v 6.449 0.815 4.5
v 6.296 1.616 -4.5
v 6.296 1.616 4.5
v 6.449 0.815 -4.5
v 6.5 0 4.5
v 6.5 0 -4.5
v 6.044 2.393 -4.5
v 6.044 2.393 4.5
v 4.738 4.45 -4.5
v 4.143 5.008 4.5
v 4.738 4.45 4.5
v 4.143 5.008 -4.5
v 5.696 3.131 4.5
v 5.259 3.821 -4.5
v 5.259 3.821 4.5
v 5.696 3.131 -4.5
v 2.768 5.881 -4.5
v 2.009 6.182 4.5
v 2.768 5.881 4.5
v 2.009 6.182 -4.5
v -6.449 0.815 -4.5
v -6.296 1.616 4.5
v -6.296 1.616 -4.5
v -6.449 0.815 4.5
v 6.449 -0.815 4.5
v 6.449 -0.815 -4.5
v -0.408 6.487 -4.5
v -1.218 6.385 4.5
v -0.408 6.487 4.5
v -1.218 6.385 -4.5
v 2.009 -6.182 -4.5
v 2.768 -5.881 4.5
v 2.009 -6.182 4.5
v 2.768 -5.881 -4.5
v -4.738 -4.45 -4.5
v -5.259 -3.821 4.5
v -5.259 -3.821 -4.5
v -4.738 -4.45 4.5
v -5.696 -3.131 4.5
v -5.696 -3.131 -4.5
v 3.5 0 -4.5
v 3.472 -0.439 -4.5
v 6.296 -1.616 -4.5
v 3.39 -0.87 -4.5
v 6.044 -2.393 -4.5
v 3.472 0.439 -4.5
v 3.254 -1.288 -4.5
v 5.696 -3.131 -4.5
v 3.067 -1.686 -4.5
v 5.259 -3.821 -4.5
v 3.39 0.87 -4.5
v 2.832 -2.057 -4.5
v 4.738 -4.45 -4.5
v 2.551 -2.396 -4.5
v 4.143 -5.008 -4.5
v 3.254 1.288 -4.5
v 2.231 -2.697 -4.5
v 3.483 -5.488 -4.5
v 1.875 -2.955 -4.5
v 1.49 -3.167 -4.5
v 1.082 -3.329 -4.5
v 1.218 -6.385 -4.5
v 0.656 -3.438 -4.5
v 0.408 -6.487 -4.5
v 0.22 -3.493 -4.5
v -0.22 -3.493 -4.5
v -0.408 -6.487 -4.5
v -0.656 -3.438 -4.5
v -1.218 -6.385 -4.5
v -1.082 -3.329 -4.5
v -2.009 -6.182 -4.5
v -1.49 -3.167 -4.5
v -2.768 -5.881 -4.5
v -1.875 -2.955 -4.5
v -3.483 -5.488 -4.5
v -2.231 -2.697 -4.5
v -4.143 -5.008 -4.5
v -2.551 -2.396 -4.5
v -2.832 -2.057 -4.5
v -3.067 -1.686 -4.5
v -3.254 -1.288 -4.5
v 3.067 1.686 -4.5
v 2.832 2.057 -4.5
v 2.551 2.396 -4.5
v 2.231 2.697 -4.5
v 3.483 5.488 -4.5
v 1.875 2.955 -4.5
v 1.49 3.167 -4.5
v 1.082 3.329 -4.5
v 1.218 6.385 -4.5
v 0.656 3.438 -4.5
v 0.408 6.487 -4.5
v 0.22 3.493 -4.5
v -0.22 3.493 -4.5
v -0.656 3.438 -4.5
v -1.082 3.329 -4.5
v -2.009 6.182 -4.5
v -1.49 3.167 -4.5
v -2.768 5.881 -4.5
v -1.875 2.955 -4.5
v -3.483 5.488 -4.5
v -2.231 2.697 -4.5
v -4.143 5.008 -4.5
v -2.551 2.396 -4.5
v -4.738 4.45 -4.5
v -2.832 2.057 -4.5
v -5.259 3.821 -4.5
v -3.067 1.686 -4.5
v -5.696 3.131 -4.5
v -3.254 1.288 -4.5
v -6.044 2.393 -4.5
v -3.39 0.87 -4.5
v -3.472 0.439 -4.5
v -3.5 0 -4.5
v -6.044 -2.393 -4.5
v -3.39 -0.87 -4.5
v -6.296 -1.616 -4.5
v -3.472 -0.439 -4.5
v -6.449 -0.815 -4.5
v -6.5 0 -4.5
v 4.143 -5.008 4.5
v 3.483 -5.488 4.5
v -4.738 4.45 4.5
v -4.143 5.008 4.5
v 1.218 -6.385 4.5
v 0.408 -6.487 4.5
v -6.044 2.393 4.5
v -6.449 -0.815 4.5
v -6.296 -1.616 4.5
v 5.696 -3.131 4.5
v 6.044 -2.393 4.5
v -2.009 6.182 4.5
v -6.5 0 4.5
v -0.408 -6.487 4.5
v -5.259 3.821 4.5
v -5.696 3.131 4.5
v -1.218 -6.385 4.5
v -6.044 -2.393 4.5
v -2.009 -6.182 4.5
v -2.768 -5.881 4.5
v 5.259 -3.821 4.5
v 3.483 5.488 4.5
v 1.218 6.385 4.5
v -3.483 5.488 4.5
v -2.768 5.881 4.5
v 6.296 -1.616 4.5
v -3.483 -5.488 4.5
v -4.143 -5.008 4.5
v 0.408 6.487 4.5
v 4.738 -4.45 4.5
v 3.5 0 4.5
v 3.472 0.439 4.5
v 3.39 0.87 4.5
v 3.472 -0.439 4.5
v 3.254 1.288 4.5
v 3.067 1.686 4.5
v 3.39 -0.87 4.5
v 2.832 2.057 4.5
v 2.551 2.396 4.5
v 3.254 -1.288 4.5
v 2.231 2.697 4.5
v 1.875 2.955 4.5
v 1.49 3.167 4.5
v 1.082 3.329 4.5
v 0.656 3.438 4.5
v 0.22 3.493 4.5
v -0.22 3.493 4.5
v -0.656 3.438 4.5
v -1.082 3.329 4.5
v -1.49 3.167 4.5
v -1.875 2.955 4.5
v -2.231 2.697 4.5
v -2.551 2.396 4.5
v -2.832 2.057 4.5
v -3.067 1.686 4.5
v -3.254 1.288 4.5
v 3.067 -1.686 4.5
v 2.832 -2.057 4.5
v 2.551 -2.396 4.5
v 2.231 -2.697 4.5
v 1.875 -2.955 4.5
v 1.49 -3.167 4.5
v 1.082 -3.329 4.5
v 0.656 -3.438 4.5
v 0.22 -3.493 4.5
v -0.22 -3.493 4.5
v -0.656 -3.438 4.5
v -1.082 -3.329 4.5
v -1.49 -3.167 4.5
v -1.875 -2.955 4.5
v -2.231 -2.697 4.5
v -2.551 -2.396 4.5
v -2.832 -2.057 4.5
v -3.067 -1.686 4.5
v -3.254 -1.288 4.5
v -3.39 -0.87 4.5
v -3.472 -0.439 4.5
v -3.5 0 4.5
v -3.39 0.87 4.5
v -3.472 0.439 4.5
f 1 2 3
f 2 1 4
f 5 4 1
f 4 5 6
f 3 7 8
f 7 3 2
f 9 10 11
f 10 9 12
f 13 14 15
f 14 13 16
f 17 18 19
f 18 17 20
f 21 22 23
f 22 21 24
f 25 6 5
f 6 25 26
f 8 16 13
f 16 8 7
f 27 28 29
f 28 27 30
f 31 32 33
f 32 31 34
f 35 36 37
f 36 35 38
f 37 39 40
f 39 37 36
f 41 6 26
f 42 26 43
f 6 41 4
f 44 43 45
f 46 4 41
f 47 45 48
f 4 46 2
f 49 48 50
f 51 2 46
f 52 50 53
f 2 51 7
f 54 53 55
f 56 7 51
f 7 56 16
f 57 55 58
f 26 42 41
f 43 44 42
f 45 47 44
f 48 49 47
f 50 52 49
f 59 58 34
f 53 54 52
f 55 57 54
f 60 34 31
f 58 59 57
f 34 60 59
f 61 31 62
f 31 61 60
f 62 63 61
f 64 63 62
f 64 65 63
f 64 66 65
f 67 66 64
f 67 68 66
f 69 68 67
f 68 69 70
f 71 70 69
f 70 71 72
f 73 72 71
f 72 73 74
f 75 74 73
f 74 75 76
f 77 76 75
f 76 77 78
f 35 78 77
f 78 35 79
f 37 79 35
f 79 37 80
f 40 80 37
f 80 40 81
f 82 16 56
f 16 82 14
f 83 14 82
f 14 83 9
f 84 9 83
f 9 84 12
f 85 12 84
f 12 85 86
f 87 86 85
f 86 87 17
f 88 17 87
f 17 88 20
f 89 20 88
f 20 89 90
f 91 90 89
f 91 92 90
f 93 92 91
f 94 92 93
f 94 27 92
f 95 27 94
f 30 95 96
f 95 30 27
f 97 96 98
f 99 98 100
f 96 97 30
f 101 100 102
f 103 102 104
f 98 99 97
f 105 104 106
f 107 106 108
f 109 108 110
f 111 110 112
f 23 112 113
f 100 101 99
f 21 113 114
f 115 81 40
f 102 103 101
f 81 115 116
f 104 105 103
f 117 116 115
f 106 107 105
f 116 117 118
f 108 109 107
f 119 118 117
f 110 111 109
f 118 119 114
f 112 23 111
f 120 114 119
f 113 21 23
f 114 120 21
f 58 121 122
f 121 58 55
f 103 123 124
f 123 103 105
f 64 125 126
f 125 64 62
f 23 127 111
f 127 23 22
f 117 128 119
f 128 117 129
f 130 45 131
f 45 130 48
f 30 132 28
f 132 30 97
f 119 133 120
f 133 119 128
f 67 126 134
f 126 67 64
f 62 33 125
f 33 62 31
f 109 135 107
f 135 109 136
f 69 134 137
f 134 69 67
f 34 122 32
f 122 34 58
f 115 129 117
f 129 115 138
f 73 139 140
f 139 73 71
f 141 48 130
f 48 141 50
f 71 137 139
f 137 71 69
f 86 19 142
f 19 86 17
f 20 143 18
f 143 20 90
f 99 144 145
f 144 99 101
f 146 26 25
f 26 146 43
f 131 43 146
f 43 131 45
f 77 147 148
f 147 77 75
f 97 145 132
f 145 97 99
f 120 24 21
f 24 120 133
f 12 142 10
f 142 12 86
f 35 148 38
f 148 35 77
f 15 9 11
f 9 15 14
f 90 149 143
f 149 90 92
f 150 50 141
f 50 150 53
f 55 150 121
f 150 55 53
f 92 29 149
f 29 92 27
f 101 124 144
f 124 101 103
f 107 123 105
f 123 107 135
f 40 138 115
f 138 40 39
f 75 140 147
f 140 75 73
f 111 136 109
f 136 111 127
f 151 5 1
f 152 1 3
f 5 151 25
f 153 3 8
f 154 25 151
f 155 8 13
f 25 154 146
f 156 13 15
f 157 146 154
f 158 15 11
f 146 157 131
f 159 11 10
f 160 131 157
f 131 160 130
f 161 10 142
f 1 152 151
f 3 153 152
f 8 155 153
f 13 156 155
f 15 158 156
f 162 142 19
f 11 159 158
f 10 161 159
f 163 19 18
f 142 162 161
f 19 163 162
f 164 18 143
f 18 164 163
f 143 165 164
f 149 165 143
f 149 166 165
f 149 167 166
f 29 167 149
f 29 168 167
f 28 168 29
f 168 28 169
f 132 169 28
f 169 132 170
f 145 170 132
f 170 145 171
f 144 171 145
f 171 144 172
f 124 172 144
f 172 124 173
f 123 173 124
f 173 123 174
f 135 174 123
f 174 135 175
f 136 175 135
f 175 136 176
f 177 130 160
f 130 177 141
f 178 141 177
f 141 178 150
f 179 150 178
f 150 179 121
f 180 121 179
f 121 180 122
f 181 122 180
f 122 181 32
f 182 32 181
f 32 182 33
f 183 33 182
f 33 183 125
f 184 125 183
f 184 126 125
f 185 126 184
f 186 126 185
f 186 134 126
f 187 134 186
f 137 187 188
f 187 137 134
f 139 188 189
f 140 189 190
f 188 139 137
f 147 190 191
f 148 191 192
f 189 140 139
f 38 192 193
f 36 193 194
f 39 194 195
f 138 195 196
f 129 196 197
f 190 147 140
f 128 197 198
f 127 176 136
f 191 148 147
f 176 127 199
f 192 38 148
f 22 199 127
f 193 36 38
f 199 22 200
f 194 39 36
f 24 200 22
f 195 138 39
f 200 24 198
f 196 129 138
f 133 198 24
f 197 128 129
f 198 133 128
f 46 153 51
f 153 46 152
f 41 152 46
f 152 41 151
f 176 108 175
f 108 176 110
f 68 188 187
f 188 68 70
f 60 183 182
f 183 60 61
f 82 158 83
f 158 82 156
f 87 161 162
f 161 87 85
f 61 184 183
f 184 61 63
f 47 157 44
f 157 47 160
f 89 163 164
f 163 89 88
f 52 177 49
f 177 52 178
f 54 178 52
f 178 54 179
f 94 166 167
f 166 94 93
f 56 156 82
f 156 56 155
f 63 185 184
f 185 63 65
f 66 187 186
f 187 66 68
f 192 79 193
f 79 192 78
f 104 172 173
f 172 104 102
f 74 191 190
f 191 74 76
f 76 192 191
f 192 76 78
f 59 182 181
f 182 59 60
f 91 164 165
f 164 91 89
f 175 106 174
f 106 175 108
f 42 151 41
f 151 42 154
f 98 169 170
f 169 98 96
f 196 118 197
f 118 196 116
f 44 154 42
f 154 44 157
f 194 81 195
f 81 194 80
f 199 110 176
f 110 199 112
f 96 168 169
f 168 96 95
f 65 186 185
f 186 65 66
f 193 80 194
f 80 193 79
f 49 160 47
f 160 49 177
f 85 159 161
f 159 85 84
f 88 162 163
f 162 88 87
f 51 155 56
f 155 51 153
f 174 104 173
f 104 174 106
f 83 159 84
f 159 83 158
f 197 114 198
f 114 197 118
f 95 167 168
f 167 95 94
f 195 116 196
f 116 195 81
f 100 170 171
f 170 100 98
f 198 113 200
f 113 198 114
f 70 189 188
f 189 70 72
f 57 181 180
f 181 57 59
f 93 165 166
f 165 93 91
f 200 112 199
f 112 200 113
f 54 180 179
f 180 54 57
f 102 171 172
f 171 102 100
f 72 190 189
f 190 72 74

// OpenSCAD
$fn = 50;


difference() {
	union() {
		translate(v = [0, 0, -4.5000000000]) {
			cylinder(h = 9, r = 6.5000000000);
		}
	}
	union() {
		translate(v = [0, 0, -100.0000000000]) {
			cylinder(h = 200, r = 3.5000000000);
		}
	}
}
